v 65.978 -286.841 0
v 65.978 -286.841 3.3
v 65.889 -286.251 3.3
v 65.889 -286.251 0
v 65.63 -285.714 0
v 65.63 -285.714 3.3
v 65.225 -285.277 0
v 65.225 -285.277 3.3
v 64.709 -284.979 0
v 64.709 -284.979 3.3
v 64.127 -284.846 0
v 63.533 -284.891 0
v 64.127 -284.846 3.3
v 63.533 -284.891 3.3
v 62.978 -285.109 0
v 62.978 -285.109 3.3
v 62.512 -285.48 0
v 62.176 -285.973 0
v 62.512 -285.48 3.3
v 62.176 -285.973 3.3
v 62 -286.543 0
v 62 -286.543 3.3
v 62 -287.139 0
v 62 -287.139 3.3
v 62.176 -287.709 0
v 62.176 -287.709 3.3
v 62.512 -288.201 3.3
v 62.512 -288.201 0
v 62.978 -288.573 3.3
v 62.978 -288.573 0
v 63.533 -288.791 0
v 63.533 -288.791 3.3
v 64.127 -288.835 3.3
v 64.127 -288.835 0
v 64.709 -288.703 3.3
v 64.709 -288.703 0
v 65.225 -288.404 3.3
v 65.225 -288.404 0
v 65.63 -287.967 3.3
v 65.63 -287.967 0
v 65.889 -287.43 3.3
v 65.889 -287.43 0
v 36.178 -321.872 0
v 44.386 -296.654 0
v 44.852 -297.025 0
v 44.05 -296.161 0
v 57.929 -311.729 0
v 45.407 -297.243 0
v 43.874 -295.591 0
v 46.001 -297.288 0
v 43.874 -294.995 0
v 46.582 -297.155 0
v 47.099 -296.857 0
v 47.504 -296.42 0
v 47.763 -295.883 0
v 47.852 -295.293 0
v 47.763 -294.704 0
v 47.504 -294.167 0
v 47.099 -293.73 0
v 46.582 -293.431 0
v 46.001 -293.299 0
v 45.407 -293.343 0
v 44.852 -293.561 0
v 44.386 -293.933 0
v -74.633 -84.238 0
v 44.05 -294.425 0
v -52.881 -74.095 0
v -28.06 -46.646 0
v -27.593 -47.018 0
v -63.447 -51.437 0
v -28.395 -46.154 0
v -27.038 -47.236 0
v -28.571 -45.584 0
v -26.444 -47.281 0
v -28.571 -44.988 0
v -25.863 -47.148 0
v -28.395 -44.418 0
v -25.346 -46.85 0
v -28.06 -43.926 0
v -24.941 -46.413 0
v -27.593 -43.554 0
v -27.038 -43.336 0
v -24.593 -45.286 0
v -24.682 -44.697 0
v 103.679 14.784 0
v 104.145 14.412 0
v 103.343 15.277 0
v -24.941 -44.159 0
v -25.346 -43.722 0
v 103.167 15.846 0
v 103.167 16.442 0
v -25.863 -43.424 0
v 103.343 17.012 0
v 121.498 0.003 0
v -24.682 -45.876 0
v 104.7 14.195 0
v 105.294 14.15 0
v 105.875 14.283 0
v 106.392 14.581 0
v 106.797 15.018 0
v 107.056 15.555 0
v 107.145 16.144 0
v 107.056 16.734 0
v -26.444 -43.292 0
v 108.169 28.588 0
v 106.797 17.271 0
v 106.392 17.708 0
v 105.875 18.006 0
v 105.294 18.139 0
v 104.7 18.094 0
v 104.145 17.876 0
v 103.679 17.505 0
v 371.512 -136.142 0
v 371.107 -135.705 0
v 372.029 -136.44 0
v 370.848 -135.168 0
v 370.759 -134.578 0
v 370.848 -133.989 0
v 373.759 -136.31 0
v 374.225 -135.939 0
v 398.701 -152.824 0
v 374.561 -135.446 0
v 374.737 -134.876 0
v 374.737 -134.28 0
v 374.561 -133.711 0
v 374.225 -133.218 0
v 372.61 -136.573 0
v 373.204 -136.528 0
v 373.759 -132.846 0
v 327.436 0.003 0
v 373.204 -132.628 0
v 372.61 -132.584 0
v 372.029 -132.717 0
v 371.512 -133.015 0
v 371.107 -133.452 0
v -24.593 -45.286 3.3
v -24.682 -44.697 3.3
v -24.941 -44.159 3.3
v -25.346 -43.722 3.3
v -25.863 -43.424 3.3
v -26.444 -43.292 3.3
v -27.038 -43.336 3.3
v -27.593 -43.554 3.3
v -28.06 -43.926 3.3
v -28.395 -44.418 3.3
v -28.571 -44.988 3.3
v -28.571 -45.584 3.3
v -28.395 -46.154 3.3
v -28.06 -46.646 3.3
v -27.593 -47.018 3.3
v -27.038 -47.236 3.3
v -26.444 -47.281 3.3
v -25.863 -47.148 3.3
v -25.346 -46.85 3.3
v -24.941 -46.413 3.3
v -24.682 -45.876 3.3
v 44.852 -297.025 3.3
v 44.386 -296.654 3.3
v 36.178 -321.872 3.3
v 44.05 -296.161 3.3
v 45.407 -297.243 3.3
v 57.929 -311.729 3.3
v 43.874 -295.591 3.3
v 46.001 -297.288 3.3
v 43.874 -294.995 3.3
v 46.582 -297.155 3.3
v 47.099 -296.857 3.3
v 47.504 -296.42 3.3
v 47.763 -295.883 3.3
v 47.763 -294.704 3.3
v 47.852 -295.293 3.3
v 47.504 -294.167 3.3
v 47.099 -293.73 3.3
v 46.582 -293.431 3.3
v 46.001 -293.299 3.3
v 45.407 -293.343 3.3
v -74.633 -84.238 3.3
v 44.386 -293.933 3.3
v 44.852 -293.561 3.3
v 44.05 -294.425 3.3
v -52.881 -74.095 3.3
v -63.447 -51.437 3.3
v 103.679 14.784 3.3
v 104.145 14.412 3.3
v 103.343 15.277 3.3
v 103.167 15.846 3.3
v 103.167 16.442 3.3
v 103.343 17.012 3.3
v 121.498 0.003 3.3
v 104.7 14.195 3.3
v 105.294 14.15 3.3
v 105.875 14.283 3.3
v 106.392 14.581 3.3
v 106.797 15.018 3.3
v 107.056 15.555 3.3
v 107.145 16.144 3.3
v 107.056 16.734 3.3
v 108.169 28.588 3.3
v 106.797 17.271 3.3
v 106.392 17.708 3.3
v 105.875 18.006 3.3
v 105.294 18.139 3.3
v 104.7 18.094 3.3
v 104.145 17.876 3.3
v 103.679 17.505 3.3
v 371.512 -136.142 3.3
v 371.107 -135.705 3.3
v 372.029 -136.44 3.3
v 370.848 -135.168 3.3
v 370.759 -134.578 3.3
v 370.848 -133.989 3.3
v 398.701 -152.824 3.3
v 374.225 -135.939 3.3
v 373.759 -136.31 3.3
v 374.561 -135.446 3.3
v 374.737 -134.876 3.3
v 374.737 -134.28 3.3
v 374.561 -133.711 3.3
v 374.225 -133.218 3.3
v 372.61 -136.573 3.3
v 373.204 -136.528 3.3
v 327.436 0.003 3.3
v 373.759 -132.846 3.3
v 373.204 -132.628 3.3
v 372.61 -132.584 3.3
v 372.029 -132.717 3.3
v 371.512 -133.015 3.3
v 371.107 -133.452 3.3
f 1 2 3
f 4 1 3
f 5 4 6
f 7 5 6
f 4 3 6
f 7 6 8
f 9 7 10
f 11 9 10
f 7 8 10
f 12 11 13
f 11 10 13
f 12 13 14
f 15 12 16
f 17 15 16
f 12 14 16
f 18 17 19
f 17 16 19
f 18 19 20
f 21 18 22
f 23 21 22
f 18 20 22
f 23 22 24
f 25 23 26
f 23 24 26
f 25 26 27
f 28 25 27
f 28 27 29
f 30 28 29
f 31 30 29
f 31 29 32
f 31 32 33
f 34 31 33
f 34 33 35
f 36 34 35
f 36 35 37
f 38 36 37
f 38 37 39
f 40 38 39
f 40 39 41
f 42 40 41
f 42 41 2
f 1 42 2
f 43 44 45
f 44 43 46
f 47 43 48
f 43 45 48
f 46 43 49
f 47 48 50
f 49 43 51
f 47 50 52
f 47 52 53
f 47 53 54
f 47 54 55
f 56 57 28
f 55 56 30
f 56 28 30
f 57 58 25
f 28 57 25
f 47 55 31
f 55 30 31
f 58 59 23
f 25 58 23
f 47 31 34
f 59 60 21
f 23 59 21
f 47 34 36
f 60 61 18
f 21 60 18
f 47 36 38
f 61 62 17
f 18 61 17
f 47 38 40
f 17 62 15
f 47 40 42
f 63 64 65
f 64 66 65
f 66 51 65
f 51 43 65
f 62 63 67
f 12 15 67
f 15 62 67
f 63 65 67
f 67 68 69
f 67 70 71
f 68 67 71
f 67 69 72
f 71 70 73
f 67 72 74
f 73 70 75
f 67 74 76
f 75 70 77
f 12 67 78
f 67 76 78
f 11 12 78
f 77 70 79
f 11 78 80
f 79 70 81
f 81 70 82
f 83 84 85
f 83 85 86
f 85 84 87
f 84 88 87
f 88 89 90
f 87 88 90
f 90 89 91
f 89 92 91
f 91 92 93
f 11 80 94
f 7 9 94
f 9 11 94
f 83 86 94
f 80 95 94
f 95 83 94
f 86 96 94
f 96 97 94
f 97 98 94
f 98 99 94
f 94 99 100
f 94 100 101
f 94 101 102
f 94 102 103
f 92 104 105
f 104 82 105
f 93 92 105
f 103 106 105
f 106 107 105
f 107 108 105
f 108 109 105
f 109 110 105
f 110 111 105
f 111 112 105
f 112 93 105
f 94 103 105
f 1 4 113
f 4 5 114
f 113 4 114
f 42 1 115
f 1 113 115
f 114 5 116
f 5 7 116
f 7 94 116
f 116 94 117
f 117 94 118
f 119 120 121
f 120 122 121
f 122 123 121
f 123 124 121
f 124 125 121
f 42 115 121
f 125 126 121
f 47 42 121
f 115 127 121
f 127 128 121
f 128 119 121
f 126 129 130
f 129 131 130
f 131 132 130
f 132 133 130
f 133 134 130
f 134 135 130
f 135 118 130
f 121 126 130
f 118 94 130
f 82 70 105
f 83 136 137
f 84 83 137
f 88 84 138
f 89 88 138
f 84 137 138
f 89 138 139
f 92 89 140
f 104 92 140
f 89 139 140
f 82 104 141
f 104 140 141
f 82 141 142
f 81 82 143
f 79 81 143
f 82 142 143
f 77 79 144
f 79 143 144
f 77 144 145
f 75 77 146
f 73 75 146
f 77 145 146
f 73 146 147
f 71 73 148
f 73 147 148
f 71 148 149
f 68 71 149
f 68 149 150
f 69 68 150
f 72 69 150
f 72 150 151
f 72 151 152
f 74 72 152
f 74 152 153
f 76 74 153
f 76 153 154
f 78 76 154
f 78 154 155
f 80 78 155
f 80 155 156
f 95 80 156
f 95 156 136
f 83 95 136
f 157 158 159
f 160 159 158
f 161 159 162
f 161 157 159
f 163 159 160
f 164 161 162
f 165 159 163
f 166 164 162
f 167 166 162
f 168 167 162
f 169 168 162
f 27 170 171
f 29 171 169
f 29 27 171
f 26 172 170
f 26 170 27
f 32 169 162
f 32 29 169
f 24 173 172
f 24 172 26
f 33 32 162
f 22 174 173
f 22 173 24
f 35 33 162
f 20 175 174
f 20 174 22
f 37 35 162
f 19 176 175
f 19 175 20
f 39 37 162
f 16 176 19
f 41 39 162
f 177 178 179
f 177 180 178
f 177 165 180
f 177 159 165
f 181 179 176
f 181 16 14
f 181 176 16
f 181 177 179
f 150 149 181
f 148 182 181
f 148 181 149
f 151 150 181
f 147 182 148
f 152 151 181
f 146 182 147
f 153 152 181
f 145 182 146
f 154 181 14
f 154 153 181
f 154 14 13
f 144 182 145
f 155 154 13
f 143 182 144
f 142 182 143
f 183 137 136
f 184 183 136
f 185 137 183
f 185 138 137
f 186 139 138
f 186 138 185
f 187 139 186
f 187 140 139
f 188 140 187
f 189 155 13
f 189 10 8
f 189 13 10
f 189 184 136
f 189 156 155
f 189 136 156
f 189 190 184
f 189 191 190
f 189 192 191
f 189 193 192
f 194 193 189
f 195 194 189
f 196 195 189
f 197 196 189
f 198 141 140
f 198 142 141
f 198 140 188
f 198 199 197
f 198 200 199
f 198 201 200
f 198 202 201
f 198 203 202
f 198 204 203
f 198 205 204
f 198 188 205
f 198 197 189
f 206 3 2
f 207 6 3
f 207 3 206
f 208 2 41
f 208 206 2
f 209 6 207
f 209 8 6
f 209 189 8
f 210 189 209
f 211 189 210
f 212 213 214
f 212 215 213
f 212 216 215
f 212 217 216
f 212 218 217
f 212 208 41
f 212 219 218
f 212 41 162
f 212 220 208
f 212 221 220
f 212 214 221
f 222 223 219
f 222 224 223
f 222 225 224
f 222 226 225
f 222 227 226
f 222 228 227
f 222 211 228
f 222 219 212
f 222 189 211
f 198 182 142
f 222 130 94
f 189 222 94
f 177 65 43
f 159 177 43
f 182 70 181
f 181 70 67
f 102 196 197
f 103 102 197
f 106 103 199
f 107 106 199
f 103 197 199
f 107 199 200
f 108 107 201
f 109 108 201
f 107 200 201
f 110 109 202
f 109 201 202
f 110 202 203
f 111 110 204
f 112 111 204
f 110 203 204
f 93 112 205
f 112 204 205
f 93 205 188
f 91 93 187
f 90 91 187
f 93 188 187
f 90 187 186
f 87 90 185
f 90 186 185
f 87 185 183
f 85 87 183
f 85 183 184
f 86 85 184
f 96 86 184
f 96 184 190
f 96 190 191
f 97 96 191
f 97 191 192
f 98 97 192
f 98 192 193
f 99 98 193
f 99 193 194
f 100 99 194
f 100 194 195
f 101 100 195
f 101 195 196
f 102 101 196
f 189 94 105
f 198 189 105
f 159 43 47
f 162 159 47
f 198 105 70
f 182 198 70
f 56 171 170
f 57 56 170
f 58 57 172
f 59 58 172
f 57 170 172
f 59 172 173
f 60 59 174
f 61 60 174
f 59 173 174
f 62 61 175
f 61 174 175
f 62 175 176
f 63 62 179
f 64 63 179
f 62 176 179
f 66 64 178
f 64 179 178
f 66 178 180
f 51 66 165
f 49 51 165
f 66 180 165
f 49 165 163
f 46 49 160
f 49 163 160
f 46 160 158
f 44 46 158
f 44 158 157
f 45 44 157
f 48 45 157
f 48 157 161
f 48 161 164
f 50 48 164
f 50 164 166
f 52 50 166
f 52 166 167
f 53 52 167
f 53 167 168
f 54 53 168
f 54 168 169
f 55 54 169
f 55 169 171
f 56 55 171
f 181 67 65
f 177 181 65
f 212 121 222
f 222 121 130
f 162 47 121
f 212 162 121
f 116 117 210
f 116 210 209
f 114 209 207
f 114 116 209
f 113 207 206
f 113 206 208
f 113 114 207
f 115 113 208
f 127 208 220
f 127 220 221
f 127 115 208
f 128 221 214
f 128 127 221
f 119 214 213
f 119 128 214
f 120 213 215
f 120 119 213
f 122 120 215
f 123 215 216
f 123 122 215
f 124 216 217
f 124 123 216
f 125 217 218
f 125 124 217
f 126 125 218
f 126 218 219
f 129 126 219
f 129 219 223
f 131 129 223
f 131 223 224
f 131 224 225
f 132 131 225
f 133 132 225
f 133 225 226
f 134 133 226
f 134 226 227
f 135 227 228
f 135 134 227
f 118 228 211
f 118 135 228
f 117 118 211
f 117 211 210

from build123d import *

# Parameters (mm, degrees)
SKETCH1_R           = 2
BOSS_EXTRUDE1_DEPTH = 3.3
SKETCH2_R           = 2
CUT_EXTRUDE1_DEPTH  = 513.420535354
SKETCH3_R           = 2
CUT_EXTRUDE2_DEPTH  = 4


with BuildPart() as part:
    # Sketch1 → Boss-Extrude1 (new body)
    with BuildSketch(Plane.XY):
        Polygon((327.436217585, 0.003466677), (121.498383462, 0.003466677), (108.169003487, 28.58841428), (-63.446663307, -51.437285405), (-52.881206764, -74.094980081), (-74.632593653, -84.237818363), (36.177914576, -321.871720124), (57.929301464, -311.728881842), (398.70102939, -152.824415428), align=None)
        with Locations(Location((372.759364157, -134.57831982, 0), (0, 0, 180))):
            Circle(SKETCH1_R, mode=Mode.SUBTRACT)
    extrude(amount=BOSS_EXTRUDE1_DEPTH)

    # Sketch2 → Cut-Extrude1 (cut, through all)
    with BuildSketch(Plane.XY.offset(3.3)):
        with Locations((105.144723808, 16.144390316)):
            Circle(SKETCH2_R)
        with Locations((-26.593400357, -45.286105853)):
            Circle(SKETCH2_R)
    extrude(amount=-CUT_EXTRUDE1_DEPTH, mode=Mode.SUBTRACT)

    # Sketch3 → Cut-Extrude2 (cut)
    with BuildSketch(Plane.XY.offset(3.3)):
        with Locations((45.851705082, -295.293199148)):
            Circle(SKETCH3_R)
        with Locations((63.977860822, -286.840833914)):
            Circle(SKETCH3_R)
    extrude(amount=-CUT_EXTRUDE2_DEPTH, mode=Mode.SUBTRACT)


solid = part.part
